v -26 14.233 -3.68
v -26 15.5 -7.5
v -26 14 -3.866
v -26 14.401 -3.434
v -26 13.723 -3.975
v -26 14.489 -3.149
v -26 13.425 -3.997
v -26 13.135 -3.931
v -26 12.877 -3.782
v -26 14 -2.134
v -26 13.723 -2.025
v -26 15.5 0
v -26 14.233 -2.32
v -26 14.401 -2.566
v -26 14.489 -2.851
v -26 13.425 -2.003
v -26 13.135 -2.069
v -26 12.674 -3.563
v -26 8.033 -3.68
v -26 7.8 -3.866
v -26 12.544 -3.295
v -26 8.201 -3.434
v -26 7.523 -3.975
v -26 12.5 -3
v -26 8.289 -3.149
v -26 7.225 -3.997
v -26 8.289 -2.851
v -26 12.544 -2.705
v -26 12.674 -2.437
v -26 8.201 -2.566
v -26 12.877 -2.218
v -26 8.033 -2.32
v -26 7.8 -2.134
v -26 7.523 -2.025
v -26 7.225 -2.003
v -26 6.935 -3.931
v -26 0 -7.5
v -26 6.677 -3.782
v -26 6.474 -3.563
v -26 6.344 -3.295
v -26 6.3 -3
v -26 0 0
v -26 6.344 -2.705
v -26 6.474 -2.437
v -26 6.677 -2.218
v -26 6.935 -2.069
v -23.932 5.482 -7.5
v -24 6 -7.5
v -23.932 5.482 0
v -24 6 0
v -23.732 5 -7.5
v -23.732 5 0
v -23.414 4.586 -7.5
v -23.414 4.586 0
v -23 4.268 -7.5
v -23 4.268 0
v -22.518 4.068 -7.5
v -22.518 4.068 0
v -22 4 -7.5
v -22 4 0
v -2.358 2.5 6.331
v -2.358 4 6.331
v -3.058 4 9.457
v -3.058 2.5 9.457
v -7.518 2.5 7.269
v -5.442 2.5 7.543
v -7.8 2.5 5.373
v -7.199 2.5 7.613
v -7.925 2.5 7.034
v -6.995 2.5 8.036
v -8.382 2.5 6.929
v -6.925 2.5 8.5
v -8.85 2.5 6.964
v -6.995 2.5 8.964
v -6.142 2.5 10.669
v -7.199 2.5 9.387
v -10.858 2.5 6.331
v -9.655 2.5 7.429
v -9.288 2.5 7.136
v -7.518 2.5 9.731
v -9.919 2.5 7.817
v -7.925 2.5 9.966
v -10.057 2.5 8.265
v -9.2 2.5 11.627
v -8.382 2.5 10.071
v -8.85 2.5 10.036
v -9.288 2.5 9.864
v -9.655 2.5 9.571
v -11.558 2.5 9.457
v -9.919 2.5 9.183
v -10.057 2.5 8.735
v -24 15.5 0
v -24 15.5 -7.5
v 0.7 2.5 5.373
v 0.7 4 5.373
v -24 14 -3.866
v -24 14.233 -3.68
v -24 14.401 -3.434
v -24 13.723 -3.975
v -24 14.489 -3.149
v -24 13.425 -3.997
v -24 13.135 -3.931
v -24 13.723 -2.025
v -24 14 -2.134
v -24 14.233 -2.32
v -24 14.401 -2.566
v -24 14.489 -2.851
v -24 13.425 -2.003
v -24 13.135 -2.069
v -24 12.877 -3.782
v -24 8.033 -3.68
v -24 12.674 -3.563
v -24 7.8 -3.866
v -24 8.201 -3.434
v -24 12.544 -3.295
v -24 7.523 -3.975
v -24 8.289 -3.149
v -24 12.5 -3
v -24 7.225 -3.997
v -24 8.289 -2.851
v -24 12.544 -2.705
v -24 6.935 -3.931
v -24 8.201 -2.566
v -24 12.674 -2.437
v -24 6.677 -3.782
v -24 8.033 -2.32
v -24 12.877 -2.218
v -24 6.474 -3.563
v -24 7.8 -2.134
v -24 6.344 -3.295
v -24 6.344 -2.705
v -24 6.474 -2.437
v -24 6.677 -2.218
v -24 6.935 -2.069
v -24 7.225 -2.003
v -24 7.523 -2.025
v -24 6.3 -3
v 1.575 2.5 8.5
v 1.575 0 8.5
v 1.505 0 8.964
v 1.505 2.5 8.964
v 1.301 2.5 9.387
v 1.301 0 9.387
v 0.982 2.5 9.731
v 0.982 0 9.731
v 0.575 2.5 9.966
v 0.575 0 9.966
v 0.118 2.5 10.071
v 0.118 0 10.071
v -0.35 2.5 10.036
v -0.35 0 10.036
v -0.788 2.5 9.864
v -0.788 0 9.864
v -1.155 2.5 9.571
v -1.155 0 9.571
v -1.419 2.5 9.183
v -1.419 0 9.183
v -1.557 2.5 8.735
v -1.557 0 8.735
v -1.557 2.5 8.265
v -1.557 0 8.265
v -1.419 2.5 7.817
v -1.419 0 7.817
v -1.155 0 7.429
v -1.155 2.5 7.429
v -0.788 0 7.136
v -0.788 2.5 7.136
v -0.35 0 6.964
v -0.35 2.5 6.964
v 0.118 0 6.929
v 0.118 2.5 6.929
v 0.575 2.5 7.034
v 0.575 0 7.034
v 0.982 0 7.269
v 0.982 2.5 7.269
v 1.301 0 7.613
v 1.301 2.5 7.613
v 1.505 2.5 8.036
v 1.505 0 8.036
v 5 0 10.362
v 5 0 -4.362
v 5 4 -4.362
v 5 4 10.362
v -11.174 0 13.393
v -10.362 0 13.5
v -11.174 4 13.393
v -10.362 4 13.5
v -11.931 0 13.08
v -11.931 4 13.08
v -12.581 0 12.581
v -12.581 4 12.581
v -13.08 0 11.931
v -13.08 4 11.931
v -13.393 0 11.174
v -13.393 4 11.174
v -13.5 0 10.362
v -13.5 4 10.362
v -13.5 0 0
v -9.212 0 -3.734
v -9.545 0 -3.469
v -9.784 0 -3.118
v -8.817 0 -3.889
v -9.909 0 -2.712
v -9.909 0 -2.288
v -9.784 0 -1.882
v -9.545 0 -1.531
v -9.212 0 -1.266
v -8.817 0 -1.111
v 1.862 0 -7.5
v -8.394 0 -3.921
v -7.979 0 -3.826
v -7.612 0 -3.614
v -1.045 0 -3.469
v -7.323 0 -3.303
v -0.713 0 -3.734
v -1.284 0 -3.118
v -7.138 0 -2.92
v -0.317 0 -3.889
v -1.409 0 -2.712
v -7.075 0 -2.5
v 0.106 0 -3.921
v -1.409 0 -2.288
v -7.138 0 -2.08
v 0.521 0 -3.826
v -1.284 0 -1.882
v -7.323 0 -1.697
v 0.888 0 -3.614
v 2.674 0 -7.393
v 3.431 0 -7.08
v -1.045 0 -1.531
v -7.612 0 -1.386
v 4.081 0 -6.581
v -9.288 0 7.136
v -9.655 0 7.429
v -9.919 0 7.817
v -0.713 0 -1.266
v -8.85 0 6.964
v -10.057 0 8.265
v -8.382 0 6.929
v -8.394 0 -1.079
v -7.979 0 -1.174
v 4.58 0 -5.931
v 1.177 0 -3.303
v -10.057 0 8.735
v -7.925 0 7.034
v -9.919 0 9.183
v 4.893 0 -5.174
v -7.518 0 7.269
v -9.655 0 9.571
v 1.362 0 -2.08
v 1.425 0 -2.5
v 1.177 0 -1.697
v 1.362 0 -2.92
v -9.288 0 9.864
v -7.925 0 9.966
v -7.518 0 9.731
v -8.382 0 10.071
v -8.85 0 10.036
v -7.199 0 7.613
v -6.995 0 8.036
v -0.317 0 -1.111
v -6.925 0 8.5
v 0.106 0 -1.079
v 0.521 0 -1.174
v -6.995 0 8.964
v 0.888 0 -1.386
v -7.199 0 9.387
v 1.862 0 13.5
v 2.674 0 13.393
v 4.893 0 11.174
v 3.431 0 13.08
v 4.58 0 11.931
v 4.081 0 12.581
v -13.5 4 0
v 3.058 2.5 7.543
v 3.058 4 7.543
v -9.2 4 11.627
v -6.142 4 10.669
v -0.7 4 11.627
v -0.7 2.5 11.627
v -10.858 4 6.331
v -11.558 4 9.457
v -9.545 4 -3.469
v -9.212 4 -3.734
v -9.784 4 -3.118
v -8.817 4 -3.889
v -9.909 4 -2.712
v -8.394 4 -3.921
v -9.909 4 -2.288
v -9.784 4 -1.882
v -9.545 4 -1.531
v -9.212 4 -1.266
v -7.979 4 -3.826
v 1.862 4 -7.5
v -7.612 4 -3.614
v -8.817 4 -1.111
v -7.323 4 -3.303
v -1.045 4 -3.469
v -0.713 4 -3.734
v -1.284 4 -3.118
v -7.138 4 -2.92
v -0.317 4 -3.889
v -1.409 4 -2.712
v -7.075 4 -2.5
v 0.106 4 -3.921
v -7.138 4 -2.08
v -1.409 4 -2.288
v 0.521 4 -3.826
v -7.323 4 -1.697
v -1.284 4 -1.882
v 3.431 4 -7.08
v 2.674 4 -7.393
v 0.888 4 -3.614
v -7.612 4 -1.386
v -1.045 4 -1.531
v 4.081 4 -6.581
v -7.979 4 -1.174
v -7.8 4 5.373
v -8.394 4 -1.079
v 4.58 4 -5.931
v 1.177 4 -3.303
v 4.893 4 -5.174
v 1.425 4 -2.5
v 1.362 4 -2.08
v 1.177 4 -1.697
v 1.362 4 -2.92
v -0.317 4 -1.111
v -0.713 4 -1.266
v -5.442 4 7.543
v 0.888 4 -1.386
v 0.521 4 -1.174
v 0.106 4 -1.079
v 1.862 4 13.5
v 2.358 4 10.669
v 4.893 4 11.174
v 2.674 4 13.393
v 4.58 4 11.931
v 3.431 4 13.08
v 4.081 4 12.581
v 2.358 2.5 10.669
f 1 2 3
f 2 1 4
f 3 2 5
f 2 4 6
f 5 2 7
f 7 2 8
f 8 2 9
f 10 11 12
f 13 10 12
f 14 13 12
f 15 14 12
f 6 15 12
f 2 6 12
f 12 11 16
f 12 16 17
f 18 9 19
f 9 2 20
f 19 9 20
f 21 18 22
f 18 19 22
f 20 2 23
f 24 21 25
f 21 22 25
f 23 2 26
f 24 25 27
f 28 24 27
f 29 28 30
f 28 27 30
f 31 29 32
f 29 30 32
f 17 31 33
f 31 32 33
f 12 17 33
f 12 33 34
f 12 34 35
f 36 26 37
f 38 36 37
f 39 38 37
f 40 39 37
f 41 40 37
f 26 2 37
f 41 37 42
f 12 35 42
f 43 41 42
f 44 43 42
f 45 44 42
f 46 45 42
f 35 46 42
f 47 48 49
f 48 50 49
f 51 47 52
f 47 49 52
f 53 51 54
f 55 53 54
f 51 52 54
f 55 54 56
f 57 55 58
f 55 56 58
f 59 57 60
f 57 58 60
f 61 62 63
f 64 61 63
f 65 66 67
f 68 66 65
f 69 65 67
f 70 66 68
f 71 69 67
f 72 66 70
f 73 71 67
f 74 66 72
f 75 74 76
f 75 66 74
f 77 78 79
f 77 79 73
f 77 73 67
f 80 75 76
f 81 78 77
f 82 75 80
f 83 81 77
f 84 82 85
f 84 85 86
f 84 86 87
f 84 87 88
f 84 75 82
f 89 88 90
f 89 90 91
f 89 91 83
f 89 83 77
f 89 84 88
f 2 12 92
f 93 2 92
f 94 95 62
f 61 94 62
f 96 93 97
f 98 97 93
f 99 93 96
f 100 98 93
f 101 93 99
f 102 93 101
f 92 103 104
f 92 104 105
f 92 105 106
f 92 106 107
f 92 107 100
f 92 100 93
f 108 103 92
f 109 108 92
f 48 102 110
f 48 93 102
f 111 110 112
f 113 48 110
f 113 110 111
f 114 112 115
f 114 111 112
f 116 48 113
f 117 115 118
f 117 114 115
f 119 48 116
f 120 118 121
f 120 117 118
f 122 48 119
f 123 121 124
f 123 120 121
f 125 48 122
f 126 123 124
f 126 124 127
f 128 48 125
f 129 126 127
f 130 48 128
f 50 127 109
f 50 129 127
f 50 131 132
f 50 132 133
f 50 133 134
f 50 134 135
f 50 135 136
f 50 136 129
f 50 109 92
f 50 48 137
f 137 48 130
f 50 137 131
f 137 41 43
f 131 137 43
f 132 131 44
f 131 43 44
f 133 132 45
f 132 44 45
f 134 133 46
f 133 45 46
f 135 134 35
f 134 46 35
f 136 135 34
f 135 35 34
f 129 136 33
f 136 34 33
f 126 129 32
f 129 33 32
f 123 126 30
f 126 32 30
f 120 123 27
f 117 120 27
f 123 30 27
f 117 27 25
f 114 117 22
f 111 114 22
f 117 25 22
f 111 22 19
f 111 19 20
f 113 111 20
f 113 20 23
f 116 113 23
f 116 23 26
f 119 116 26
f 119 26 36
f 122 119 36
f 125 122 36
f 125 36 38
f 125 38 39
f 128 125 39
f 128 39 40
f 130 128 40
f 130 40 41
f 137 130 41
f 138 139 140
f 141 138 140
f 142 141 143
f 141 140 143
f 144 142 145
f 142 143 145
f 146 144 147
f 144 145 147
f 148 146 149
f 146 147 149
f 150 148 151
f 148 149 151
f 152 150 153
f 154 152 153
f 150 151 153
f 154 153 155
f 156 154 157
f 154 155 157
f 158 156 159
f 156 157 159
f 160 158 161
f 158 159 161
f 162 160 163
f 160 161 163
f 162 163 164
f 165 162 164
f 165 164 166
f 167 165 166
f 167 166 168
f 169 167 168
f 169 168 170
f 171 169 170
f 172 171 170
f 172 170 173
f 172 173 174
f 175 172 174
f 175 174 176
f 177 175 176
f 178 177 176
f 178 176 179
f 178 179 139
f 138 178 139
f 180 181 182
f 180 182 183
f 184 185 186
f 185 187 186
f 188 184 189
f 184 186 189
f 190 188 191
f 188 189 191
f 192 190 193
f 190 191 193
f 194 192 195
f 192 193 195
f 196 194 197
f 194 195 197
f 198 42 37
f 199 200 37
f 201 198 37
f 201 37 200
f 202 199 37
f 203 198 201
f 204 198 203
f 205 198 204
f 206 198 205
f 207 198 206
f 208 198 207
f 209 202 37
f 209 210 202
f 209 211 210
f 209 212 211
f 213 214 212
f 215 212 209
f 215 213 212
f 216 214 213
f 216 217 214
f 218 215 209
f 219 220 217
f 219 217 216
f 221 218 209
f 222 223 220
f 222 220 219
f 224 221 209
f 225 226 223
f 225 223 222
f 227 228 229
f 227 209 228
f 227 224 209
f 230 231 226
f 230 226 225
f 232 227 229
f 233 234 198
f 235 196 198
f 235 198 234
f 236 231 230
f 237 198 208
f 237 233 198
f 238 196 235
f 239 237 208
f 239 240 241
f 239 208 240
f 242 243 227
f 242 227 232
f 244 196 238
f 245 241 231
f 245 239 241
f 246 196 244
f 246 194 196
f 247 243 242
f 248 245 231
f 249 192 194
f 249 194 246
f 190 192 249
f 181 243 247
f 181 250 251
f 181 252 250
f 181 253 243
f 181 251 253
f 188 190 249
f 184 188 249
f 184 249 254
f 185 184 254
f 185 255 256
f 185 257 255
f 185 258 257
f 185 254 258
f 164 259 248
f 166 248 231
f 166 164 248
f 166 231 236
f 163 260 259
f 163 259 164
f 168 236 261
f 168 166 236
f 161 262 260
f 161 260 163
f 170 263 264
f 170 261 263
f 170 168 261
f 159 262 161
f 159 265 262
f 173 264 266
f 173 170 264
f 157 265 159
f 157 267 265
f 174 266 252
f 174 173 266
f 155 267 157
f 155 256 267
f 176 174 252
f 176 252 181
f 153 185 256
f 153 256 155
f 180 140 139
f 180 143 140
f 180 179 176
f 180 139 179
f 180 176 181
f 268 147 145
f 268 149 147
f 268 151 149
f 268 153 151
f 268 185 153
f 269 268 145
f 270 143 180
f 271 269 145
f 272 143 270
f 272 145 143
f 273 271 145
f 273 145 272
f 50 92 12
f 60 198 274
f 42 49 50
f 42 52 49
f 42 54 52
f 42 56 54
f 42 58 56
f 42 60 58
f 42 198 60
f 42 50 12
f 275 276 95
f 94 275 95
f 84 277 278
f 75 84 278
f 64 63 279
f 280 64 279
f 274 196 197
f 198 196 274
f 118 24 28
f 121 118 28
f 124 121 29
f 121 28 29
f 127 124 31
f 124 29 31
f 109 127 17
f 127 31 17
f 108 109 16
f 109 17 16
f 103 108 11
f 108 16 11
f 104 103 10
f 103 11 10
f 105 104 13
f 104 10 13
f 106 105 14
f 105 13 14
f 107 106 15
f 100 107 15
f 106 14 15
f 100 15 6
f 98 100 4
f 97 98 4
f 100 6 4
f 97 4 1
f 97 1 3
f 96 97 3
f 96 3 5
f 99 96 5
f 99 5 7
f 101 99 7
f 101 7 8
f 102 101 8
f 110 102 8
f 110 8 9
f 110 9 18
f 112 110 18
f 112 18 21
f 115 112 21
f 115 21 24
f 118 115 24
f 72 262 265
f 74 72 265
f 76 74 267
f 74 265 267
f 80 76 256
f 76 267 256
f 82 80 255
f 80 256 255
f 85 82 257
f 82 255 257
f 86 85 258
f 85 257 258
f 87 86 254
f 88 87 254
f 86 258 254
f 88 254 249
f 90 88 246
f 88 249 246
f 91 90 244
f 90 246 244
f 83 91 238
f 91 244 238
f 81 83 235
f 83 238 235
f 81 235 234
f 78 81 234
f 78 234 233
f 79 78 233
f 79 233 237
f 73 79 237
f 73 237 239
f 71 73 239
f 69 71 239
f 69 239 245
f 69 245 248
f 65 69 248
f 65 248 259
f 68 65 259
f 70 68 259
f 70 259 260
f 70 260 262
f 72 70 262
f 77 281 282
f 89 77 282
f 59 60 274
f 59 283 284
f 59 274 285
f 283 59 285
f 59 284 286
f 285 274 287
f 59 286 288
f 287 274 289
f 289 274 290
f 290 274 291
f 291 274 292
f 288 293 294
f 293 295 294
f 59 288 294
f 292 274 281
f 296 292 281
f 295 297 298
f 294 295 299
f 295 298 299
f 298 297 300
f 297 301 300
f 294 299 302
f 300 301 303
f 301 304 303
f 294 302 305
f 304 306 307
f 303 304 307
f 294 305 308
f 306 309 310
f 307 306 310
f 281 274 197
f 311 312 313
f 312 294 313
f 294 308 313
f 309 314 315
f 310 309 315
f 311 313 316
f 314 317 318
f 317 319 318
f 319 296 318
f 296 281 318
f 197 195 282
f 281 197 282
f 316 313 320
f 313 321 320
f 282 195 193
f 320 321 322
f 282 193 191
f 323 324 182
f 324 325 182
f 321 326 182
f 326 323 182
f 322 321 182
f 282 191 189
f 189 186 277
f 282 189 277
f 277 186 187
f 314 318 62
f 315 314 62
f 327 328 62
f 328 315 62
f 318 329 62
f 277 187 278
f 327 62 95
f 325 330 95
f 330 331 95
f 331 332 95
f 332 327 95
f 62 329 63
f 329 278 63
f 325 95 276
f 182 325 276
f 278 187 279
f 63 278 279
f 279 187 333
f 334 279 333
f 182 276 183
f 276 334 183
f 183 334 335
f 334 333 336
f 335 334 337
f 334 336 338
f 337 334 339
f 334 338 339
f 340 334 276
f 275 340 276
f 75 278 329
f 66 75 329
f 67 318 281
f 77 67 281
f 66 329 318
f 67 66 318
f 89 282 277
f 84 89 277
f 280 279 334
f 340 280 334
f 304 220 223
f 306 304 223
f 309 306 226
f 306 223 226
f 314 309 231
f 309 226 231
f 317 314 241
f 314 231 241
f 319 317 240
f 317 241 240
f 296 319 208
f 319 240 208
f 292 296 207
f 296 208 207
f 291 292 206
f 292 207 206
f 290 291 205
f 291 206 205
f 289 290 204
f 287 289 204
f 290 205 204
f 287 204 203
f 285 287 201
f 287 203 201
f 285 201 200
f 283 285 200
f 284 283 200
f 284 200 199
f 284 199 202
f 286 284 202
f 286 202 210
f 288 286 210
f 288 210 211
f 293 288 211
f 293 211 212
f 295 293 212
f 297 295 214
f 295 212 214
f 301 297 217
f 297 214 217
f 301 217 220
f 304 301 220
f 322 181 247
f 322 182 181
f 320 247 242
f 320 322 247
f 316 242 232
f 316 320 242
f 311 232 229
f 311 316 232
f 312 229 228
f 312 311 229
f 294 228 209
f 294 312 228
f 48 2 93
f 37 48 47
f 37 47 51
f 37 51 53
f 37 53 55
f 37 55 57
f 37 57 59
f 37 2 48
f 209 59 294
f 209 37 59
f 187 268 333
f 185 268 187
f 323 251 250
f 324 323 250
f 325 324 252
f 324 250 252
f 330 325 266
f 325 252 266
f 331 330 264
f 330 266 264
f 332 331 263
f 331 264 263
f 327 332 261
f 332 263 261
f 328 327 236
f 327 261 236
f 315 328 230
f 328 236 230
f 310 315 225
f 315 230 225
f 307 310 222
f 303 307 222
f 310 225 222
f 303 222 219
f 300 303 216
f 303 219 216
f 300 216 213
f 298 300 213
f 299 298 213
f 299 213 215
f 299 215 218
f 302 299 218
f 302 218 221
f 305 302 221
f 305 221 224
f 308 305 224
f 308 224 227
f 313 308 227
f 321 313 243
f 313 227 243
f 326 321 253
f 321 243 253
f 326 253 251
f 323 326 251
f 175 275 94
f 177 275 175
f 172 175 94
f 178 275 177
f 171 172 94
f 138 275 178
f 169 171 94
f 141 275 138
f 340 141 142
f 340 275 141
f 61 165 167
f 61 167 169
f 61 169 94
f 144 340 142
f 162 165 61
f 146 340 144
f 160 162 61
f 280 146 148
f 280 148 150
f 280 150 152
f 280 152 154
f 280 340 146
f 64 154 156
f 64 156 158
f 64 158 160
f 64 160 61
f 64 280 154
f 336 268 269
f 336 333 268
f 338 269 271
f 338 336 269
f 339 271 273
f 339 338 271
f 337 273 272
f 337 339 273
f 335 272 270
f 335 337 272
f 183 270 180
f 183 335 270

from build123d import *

# Parameters (mm, degrees)
F0_R     = 1.425
F0_R_2   = 1.575
F1_DEPTH = 4
F3_DEPTH = 1.5
F4_R     = 3.138478
F0_W     = 2
F0_H     = 7.5
F0_W_2   = 10.5
F5_DEPTH = 4
F6_DEPTH = 15.5
F7_R     = 1
F8_DEPTH = 3
F9_R     = 2


with BuildPart() as f1:
    # F0 (on Front) → F1 (new body)
    with BuildSketch(Plane.XZ):
        Polygon((5, 13.5), (-13.5, 13.5), (-13.5, 0), (-13.5, -7.5), (5, -7.5), align=None)
        with Locations((-8.5, -2.5)):
            Circle(F0_R, mode=Mode.SUBTRACT)
        with Locations((0, -2.5)):
            Circle(F0_R, mode=Mode.SUBTRACT)
        with Locations((-8.5, 8.5)):
            Circle(F0_R_2, mode=Mode.SUBTRACT)
        with Locations((0, 8.5)):
            Circle(F0_R_2, mode=Mode.SUBTRACT)
    extrude(amount=-F1_DEPTH)

    # F2 (on face) → F3 (cut)
    with BuildSketch(Plane(origin=(0, 4, 0), x_dir=(-1, 0, 0), z_dir=(0, 1, 0))):
        Polygon((-0.699741, 5.373043), (2.358154, 6.330527), (3.057895, 9.457485), (0.699741, 11.626957), (-2.358154, 10.669473), (-3.057895, 7.542515), align=None)
        Polygon((7.800259, 5.373043), (10.858154, 6.330527), (11.557895, 9.457485), (9.199741, 11.626957), (6.141846, 10.669473), (5.442105, 7.542515), align=None)
    extrude(amount=-F3_DEPTH, mode=Mode.SUBTRACT)

    # F4
    f4_edges = [f1.edges().sort_by_distance(p)[0] for p in [
        (5, 2, 13.5),
        (-13.5, 2, 13.5),
        (5, 2, -7.5),
    ]]
    fillet(f4_edges, radius=F4_R)

    # F0 (on Front) → F5 (join)
    with BuildSketch(Plane.XZ):
        with Locations((-25, -3.75)):
            Rectangle(F0_W, F0_H)
        with Locations((-18.75, -3.75)):
            Rectangle(F0_W_2, F0_H)
    extrude(amount=-F5_DEPTH)

    # F0 (on Front) → F6 (join)
    with BuildSketch(Plane.XZ):
        with Locations((-25, -3.75)):
            Rectangle(F0_W, F0_H)
    extrude(amount=-F6_DEPTH)

    # F7 (on face) → F8 (cut)
    with BuildSketch(Plane(origin=(-26, 0, 0), x_dir=(0, -1, 0), z_dir=(-1, 0, 0))):
        with Locations((-13.5, -3)):
            Circle(F7_R)
        with Locations((-7.3, -3)):
            Circle(F7_R)
    extrude(amount=-F8_DEPTH, mode=Mode.SUBTRACT)

    # F9
    f9_edges = [f1.edges().sort_by_distance(p)[0] for p in [
        (-24, 4, -3.75),
    ]]
    fillet(f9_edges, radius=F9_R)


solid = f1.part
